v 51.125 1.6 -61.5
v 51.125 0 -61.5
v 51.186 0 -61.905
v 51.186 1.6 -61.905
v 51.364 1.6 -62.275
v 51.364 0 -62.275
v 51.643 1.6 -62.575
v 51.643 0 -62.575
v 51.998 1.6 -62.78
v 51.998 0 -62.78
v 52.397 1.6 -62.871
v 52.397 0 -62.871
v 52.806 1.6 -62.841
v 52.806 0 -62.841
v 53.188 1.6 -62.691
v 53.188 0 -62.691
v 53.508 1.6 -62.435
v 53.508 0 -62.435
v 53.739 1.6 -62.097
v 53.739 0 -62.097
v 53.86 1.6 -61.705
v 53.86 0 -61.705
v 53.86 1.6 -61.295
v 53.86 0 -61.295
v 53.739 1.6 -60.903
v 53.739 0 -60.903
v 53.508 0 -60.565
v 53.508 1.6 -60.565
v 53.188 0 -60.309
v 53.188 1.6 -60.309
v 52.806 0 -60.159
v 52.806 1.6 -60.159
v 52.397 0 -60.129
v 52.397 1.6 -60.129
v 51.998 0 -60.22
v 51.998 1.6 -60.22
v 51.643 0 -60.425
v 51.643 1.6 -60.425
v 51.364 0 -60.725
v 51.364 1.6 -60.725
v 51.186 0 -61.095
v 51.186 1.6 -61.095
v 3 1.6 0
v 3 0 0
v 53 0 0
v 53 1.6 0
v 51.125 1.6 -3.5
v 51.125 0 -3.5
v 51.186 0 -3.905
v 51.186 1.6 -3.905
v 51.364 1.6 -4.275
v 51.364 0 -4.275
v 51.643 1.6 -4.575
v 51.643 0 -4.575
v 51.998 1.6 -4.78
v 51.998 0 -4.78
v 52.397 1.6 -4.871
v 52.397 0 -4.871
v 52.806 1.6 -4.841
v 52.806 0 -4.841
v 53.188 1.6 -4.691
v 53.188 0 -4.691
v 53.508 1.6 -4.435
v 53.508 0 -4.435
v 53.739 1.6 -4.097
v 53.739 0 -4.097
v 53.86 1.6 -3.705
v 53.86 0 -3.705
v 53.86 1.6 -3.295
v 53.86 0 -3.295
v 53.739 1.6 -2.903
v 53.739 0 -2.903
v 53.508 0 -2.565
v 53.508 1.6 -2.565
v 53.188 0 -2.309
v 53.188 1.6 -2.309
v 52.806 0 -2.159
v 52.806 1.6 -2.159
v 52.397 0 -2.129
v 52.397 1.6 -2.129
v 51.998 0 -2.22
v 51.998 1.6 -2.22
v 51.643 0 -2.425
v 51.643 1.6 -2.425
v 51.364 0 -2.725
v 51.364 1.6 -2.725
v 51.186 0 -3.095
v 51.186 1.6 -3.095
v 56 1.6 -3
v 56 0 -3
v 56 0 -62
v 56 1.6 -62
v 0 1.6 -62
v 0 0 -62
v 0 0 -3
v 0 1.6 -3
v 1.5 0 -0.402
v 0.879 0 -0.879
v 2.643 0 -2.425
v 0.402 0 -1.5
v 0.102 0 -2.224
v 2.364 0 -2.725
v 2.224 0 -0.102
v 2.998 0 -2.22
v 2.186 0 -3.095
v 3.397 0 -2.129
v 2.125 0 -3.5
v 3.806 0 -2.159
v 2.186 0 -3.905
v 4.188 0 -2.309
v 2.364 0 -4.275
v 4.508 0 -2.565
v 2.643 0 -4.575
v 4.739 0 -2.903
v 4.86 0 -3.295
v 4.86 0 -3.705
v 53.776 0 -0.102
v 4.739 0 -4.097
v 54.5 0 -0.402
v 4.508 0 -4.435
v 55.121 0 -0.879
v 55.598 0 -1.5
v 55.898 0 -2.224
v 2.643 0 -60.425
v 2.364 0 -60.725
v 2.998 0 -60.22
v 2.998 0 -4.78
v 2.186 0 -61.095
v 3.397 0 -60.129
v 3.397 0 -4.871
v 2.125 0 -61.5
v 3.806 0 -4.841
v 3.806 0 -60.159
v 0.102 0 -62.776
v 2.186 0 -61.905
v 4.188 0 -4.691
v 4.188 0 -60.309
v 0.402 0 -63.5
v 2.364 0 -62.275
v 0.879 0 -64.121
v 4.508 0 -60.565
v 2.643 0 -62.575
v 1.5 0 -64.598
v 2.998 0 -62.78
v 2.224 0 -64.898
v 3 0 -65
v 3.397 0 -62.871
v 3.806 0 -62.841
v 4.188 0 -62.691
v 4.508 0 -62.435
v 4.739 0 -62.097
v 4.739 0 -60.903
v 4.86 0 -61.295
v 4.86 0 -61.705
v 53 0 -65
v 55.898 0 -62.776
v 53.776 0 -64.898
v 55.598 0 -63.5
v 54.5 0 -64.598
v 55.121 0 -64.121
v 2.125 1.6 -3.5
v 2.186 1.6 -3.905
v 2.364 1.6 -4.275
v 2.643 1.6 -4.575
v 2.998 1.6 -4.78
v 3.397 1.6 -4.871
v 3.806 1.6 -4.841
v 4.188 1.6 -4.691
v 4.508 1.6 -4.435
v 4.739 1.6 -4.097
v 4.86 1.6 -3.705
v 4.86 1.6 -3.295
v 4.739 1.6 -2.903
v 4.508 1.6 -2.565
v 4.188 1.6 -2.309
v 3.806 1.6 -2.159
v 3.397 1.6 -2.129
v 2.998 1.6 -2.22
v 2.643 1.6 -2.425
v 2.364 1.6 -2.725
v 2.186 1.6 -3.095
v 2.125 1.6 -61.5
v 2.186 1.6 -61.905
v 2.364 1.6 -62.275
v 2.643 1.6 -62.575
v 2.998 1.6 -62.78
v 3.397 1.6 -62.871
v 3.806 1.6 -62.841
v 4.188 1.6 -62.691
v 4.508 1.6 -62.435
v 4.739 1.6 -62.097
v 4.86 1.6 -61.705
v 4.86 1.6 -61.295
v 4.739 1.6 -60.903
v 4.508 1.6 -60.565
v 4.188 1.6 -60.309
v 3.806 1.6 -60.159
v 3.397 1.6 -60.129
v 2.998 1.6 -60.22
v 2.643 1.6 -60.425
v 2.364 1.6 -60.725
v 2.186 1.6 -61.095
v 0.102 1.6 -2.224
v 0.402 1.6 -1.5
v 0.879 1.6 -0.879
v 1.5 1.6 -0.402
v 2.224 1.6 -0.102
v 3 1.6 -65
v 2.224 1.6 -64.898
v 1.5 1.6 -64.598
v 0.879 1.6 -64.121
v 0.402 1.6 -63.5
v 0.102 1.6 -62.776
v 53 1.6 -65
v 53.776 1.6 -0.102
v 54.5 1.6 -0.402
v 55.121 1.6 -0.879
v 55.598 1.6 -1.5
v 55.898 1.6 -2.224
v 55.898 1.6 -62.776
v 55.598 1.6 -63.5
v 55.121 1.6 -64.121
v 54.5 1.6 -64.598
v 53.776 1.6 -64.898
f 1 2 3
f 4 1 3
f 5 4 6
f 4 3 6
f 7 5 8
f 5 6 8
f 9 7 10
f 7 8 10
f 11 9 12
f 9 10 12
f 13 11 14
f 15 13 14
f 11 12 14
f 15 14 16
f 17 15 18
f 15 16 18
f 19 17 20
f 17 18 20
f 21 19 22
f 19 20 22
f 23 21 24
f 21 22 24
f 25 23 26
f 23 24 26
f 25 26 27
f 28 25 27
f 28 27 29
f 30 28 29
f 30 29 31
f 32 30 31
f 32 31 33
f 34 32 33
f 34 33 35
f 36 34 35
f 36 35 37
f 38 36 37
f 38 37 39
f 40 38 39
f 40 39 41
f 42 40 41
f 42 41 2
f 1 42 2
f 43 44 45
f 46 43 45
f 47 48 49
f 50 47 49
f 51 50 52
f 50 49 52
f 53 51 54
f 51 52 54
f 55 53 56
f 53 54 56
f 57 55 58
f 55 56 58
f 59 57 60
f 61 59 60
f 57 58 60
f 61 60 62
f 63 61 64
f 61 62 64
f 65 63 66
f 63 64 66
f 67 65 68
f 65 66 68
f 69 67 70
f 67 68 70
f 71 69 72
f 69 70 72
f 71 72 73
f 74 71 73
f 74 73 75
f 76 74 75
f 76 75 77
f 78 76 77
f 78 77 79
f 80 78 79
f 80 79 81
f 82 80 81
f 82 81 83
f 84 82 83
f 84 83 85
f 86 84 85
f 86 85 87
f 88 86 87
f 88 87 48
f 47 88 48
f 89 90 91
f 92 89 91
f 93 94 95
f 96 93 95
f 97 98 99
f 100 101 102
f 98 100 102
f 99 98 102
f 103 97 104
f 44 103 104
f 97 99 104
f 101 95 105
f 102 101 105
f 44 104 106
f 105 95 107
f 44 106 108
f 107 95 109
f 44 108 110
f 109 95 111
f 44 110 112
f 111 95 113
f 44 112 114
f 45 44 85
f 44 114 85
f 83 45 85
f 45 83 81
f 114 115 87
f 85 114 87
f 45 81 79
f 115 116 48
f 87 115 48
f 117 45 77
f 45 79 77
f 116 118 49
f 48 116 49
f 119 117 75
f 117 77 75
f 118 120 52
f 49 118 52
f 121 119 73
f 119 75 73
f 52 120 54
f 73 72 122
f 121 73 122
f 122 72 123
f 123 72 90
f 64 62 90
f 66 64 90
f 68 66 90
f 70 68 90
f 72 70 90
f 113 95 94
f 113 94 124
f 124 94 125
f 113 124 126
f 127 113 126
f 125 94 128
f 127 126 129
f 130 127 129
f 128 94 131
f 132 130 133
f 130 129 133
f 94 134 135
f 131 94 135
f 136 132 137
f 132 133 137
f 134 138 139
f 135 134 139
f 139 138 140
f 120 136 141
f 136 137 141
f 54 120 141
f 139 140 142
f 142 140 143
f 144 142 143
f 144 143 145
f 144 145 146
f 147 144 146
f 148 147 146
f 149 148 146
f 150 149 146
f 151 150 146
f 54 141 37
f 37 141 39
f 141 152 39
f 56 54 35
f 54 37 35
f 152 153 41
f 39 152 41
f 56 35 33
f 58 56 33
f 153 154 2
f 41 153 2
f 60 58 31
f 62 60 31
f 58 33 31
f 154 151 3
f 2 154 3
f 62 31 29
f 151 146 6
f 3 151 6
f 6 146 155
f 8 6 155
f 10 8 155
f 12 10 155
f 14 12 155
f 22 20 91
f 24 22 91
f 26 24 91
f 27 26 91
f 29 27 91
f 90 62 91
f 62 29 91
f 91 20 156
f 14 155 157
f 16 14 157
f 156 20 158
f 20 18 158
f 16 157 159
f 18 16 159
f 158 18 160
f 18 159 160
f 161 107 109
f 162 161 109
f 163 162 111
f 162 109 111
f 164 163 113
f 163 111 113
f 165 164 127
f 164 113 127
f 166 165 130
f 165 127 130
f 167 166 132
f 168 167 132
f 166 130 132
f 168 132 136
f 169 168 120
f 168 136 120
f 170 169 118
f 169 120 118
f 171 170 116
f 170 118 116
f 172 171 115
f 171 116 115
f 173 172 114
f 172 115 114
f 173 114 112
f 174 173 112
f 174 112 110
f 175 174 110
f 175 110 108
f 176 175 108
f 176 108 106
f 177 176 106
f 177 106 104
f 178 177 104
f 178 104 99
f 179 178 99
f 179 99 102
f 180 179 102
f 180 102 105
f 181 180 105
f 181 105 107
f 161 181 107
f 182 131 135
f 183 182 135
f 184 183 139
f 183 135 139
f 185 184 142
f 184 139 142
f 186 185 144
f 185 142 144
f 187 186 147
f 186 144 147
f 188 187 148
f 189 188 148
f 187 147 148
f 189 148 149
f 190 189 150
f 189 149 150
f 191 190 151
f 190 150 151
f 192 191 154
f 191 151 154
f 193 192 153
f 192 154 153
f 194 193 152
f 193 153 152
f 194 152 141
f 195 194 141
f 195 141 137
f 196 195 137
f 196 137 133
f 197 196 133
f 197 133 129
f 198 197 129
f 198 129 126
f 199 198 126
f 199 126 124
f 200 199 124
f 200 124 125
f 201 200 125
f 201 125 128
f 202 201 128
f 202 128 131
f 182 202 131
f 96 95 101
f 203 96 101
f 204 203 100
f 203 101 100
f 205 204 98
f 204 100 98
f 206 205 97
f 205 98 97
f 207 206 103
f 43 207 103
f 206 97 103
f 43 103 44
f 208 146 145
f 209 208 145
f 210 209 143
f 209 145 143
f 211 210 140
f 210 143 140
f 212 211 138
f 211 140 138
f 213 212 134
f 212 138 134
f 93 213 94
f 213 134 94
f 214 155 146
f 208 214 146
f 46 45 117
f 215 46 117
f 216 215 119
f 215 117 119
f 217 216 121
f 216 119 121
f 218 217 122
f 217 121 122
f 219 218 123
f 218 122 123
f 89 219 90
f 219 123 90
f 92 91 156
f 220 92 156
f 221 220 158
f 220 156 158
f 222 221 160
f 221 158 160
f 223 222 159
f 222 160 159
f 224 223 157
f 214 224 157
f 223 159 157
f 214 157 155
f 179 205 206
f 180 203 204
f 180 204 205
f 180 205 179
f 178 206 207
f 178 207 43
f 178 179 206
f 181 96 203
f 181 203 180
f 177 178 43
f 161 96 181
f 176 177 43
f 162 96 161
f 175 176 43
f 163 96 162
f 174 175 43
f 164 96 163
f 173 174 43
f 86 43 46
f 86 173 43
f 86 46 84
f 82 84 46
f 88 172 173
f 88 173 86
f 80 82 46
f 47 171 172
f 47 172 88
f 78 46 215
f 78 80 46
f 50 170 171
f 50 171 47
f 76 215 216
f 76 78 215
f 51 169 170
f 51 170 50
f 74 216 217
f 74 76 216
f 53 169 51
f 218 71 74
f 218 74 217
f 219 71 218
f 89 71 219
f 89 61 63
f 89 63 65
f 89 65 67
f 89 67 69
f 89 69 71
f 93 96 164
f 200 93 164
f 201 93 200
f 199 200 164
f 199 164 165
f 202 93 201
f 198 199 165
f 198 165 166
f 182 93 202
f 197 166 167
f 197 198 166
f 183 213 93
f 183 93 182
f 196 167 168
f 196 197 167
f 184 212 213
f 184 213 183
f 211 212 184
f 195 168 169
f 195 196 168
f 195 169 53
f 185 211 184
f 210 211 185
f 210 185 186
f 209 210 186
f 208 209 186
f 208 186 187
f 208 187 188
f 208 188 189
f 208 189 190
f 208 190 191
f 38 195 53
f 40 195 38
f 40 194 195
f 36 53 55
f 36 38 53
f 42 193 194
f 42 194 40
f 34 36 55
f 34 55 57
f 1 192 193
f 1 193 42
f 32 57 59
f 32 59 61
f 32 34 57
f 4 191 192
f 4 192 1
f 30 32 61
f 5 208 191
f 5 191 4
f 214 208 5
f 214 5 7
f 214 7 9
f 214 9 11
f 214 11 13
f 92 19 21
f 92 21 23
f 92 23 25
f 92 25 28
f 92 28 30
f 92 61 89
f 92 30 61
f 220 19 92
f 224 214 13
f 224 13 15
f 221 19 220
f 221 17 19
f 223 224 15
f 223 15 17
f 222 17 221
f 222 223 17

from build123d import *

# Parameters (mm, degrees)
BOSS_EXTRUDE1_DEPTH        = 1.6002
F_2_7_2_7_DIAMETER_HOLE1_D = 2.75


with BuildPart() as part:
    # Sketch1 → Boss-Extrude1 (new body)
    with BuildSketch(Plane(origin=(0, 0, 0), x_dir=(1, 0, 0), z_dir=(0, 1, 0))):
        with BuildLine():
            Line((3, 0), (53, 0))
            ThreePointArc((53, 0), (55.121320344, 0.878679656), (56, 3))
            Line((56, 3), (56, 62))
            ThreePointArc((56, 62), (55.121320344, 64.121320344), (53, 65))
            Line((53, 65), (3, 65))
            ThreePointArc((3, 65), (0.878679656, 64.121320344), (0, 62))
            Line((0, 62), (0, 3))
            ThreePointArc((0, 3), (0.878679656, 0.878679656), (3, 0))
        make_face()
    extrude(amount=BOSS_EXTRUDE1_DEPTH)

    # Ø2.7 (2.7) Diameter Hole1 (through all)
    with Locations(Plane(origin=(0, 1.6002, 0), x_dir=(1, 0, 0), z_dir=(0, 1, 0))):
        with Locations((3.5, 61.5), (3.5, 3.5), (52.5, 61.5), (52.5, 3.5)):
            Hole(F_2_7_2_7_DIAMETER_HOLE1_D / 2)


solid = part.part
